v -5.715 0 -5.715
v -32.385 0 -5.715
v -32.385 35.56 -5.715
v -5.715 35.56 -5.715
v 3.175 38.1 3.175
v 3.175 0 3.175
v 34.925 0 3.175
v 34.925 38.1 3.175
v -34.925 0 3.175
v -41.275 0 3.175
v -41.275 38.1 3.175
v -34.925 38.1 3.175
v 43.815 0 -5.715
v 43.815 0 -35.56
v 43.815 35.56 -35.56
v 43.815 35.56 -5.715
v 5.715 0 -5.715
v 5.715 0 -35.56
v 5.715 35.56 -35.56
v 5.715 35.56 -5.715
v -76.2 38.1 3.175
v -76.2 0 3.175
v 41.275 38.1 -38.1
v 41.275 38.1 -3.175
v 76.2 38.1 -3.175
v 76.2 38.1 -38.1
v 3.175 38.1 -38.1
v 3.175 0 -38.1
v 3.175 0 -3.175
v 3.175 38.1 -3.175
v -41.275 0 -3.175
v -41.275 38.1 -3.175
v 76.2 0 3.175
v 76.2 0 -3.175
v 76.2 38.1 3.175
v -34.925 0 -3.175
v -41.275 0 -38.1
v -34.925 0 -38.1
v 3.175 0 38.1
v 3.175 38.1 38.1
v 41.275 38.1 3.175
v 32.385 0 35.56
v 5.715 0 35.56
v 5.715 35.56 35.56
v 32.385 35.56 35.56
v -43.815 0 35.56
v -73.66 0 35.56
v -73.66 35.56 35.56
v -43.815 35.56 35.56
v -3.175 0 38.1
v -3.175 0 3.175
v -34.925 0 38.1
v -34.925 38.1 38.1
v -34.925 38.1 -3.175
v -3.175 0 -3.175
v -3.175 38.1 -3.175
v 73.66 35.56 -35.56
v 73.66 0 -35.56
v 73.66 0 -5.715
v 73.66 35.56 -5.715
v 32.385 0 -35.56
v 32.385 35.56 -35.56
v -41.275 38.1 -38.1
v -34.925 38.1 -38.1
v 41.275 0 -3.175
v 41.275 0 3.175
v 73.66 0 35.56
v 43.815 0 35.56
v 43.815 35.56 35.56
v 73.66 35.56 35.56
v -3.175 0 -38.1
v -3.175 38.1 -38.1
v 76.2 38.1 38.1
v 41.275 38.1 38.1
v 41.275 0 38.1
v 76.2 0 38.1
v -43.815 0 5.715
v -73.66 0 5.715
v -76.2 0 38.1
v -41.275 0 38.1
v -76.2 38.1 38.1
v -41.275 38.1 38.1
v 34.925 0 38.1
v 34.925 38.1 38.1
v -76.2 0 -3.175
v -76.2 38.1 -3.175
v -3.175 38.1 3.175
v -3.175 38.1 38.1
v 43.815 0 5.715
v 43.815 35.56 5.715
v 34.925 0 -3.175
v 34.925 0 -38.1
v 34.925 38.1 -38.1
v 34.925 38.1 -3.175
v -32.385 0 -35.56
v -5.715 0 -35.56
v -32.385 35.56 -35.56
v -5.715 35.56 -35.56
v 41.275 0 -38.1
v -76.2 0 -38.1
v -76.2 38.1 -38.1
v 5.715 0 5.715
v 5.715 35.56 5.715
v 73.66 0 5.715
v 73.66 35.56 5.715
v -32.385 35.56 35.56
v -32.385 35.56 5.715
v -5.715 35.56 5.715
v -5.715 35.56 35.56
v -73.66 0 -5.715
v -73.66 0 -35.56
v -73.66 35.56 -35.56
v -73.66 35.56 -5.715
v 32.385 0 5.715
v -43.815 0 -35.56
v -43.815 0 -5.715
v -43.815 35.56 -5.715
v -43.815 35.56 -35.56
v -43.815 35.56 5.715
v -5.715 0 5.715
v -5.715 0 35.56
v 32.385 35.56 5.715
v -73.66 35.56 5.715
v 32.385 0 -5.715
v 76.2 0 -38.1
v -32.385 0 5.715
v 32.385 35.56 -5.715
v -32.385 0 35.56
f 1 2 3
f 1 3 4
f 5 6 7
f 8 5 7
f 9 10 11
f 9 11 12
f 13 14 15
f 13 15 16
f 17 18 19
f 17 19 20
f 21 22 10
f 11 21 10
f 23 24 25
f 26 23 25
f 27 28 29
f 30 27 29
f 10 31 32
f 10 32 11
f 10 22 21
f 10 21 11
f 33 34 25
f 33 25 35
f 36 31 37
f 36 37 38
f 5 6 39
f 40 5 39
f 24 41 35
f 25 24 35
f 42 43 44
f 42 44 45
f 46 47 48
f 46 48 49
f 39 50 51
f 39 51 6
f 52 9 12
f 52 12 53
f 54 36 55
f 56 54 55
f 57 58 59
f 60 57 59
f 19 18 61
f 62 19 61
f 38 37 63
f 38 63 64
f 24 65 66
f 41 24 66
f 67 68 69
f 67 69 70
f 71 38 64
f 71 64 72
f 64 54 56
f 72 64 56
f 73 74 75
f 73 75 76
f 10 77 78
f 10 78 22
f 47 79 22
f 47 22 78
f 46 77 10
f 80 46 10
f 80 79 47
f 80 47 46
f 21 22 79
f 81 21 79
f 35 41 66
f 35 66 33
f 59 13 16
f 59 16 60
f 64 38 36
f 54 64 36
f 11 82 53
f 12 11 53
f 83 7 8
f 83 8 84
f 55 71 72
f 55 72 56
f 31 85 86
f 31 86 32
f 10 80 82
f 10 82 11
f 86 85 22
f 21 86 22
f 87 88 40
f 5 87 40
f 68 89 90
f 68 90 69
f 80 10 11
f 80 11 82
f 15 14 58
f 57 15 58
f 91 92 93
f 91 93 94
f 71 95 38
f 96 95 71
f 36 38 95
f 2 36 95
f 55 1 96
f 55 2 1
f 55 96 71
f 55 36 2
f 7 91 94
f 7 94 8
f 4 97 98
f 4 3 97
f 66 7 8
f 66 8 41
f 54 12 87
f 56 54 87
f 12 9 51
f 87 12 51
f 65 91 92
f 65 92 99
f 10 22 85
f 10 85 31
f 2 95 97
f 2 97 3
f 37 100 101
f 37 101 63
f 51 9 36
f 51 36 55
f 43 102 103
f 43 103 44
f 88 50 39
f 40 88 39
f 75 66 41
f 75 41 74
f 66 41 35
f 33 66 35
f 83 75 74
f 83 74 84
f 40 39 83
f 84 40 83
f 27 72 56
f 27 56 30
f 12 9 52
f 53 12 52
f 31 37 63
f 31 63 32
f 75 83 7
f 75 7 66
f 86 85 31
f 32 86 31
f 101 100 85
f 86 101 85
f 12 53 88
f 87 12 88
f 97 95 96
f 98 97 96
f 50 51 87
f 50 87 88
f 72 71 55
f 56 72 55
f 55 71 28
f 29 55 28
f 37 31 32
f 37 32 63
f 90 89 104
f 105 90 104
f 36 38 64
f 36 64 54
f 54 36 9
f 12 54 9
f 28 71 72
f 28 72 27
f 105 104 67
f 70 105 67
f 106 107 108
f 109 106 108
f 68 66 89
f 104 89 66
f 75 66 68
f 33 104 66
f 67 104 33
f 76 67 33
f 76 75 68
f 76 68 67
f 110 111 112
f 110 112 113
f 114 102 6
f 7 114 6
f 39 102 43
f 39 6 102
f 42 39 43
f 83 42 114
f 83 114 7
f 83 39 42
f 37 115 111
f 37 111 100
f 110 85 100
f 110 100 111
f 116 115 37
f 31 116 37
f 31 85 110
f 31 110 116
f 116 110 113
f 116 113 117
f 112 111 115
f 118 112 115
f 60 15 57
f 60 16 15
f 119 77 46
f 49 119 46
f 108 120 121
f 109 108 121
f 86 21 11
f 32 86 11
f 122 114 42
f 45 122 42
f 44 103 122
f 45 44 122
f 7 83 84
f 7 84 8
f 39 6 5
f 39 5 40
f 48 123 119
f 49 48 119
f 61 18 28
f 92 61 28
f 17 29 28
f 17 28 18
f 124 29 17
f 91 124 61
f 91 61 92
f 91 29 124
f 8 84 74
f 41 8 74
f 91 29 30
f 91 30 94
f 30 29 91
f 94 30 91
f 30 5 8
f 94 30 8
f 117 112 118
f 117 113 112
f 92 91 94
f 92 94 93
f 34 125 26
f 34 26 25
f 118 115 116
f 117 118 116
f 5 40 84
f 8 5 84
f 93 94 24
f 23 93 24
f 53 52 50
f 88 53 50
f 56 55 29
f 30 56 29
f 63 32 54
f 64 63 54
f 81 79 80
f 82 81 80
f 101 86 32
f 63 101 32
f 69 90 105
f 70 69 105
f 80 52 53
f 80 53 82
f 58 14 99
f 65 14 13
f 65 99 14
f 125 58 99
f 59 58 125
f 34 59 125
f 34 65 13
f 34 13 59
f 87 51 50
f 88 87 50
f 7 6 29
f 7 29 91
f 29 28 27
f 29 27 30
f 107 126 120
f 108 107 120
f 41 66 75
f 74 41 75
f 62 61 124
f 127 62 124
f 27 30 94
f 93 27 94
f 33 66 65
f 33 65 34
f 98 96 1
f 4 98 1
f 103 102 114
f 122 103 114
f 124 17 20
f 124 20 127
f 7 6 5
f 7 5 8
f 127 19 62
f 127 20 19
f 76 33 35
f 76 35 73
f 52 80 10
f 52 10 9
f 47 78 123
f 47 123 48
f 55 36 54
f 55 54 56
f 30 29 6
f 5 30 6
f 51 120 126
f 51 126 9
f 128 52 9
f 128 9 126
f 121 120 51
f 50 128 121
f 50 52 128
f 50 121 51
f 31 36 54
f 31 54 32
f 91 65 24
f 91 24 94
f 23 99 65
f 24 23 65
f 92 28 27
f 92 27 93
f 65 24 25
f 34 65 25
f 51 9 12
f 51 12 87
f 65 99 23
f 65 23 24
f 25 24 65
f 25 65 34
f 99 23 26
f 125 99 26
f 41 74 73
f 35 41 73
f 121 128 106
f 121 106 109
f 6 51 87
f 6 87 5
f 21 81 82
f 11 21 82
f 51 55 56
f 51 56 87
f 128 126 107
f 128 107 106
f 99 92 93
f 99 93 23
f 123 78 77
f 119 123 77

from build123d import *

# Parameters (mm, degrees)
F0_W     = 34.925
F0_H     = 34.925
F1_DEPTH = 38.1
F0_W_2   = 31.75
F2_T     = -2.54
F2_2_T   = -2.54
F2_3_T   = -2.54
F2_4_T   = -2.54
F2_5_T   = -2.54
F2_6_T   = -2.54
F2_7_T   = -2.54
F2_8_T   = -2.54
F0_H_2   = 6.35
F3_DEPTH = 38.1
F0_W_3   = 6.35


with BuildPart() as f1:
    # F0 (on Front) → F1 (new body)
    with BuildSketch(Plane.XZ):
        with Locations((-58.7375, 20.6375)):
            Rectangle(F0_W, F0_H)
    extrude(amount=-F1_DEPTH)

    # F2
    f2_openings = [f1.faces().sort_by_distance(p)[0] for p in [
        (-58.7375, 0, 20.6375),
    ]]
    offset(amount=F2_T, openings=f2_openings)


with BuildPart() as f1b:
    # F0 (on Front) → F1, piece 2 (new body)
    with BuildSketch(Plane.XZ):
        with Locations((-19.05, 20.6375)):
            Rectangle(F0_W_2, F0_H)
    extrude(amount=-F1_DEPTH)

    # F2#2
    f2_2_openings = [f1b.faces().sort_by_distance(p)[0] for p in [
        (-19.05, 0, 20.6375),
    ]]
    offset(amount=F2_2_T, openings=f2_2_openings)


with BuildPart() as f1c:
    # F0 (on Front) → F1, piece 3 (new body)
    with BuildSketch(Plane.XZ):
        with Locations((19.05, 20.6375)):
            Rectangle(F0_W_2, F0_H)
    extrude(amount=-F1_DEPTH)

    # F2#3
    f2_3_openings = [f1c.faces().sort_by_distance(p)[0] for p in [
        (19.05, 0, 20.6375),
    ]]
    offset(amount=F2_3_T, openings=f2_3_openings)


with BuildPart() as f1d:
    # F0 (on Front) → F1, piece 4 (new body)
    with BuildSketch(Plane.XZ):
        with Locations((58.7375, 20.6375)):
            Rectangle(F0_W, F0_H)
    extrude(amount=-F1_DEPTH)

    # F2#4
    f2_4_openings = [f1d.faces().sort_by_distance(p)[0] for p in [
        (58.7375, 0, 20.6375),
    ]]
    offset(amount=F2_4_T, openings=f2_4_openings)


with BuildPart() as f1e:
    # F0 (on Front) → F1, piece 5 (new body)
    with BuildSketch(Plane.XZ):
        with Locations((58.7375, -20.6375)):
            Rectangle(F0_W, F0_H)
    extrude(amount=-F1_DEPTH)

    # F2#5
    f2_5_openings = [f1e.faces().sort_by_distance(p)[0] for p in [
        (58.7375, 0, -20.6375),
    ]]
    offset(amount=F2_5_T, openings=f2_5_openings)


with BuildPart() as f1f:
    # F0 (on Front) → F1, piece 6 (new body)
    with BuildSketch(Plane.XZ):
        with Locations((19.05, -20.6375)):
            Rectangle(F0_W_2, F0_H)
    extrude(amount=-F1_DEPTH)

    # F2#6
    f2_6_openings = [f1f.faces().sort_by_distance(p)[0] for p in [
        (19.05, 0, -20.6375),
    ]]
    offset(amount=F2_6_T, openings=f2_6_openings)


with BuildPart() as f1g:
    # F0 (on Front) → F1, piece 7 (new body)
    with BuildSketch(Plane.XZ):
        with Locations((-19.05, -20.6375)):
            Rectangle(F0_W_2, F0_H)
    extrude(amount=-F1_DEPTH)

    # F2#7
    f2_7_openings = [f1g.faces().sort_by_distance(p)[0] for p in [
        (-19.05, 0, -20.6375),
    ]]
    offset(amount=F2_7_T, openings=f2_7_openings)


with BuildPart() as f1h:
    # F0 (on Front) → F1, piece 8 (new body)
    with BuildSketch(Plane.XZ):
        with Locations((-58.7375, -20.6375)):
            Rectangle(F0_W, F0_H)
    extrude(amount=-F1_DEPTH)

    # F2#8
    f2_8_openings = [f1h.faces().sort_by_distance(p)[0] for p in [
        (-58.7375, 0, -20.6375),
    ]]
    offset(amount=F2_8_T, openings=f2_8_openings)


with BuildPart() as f3:
    # F0 (on Front) → F3 (new body)
    with BuildSketch(Plane.XZ):
        with Locations((-58.7375, 0)):
            Rectangle(F0_W, F0_H_2)
    extrude(amount=-F3_DEPTH)


with BuildPart() as f3b:
    # F0 (on Front) → F3, piece 2 (new body)
    with BuildSketch(Plane.XZ):
        Polygon((-34.925, 3.175), (-34.925, 38.1), (-38.1, 38.1), (-41.275, 38.1), (-41.275, 3.175), align=None)
    extrude(amount=-F3_DEPTH)


with BuildPart() as f3c:
    # F0 (on Front) → F3, piece 3 (new body)
    with BuildSketch(Plane.XZ):
        with Locations((-19.05, 0)):
            Rectangle(F0_W_2, F0_H_2)
    extrude(amount=-F3_DEPTH)


with BuildPart() as f3d:
    # F0 (on Front) → F3, piece 4 (new body)
    with BuildSketch(Plane.XZ):
        Polygon((-34.925, -38.1), (-34.925, -3.175), (-41.275, -3.175), (-41.275, -38.1), (-38.1, -38.1), align=None)
    extrude(amount=-F3_DEPTH)


with BuildPart() as f3e:
    # F0 (on Front) → F3, piece 5 (new body)
    with BuildSketch(Plane.XZ):
        with Locations((0, -20.6375)):
            Rectangle(F0_W_3, F0_H)
    extrude(amount=-F3_DEPTH)


with BuildPart() as f3f:
    # F0 (on Front) → F3, piece 6 (new body)
    with BuildSketch(Plane.XZ):
        with Locations((0, 20.6375)):
            Rectangle(F0_W_3, F0_H)
    extrude(amount=-F3_DEPTH)


with BuildPart() as f3g:
    # F0 (on Front) → F3, piece 7 (new body)
    with BuildSketch(Plane.XZ):
        Polygon((41.275, 3.175), (41.275, 38.1), (38.1, 38.1), (34.925, 38.1), (34.925, 3.175), align=None)
    extrude(amount=-F3_DEPTH)


with BuildPart() as f3h:
    # F0 (on Front) → F3, piece 8 (new body)
    with BuildSketch(Plane.XZ):
        Polygon((41.275, -38.1), (41.275, -3.175), (34.925, -3.175), (34.925, -38.1), (38.1, -38.1), align=None)
    extrude(amount=-F3_DEPTH)


with BuildPart() as f3i:
    # F0 (on Front) → F3, piece 9 (new body)
    with BuildSketch(Plane.XZ):
        with Locations((58.7375, 0)):
            Rectangle(F0_W, F0_H_2)
    extrude(amount=-F3_DEPTH)


with BuildPart() as f3j:
    # F0 (on Front) → F3, piece 10 (new body)
    with BuildSketch(Plane.XZ):
        with Locations((19.05, 0)):
            Rectangle(F0_W_2, F0_H_2)
    extrude(amount=-F3_DEPTH)


solid = Compound([f1.part, f1b.part, f1c.part, f1d.part, f1e.part, f1f.part, f1g.part, f1h.part, f3.part, f3b.part, f3c.part, f3d.part, f3e.part, f3f.part, f3g.part, f3h.part, f3i.part, f3j.part])
